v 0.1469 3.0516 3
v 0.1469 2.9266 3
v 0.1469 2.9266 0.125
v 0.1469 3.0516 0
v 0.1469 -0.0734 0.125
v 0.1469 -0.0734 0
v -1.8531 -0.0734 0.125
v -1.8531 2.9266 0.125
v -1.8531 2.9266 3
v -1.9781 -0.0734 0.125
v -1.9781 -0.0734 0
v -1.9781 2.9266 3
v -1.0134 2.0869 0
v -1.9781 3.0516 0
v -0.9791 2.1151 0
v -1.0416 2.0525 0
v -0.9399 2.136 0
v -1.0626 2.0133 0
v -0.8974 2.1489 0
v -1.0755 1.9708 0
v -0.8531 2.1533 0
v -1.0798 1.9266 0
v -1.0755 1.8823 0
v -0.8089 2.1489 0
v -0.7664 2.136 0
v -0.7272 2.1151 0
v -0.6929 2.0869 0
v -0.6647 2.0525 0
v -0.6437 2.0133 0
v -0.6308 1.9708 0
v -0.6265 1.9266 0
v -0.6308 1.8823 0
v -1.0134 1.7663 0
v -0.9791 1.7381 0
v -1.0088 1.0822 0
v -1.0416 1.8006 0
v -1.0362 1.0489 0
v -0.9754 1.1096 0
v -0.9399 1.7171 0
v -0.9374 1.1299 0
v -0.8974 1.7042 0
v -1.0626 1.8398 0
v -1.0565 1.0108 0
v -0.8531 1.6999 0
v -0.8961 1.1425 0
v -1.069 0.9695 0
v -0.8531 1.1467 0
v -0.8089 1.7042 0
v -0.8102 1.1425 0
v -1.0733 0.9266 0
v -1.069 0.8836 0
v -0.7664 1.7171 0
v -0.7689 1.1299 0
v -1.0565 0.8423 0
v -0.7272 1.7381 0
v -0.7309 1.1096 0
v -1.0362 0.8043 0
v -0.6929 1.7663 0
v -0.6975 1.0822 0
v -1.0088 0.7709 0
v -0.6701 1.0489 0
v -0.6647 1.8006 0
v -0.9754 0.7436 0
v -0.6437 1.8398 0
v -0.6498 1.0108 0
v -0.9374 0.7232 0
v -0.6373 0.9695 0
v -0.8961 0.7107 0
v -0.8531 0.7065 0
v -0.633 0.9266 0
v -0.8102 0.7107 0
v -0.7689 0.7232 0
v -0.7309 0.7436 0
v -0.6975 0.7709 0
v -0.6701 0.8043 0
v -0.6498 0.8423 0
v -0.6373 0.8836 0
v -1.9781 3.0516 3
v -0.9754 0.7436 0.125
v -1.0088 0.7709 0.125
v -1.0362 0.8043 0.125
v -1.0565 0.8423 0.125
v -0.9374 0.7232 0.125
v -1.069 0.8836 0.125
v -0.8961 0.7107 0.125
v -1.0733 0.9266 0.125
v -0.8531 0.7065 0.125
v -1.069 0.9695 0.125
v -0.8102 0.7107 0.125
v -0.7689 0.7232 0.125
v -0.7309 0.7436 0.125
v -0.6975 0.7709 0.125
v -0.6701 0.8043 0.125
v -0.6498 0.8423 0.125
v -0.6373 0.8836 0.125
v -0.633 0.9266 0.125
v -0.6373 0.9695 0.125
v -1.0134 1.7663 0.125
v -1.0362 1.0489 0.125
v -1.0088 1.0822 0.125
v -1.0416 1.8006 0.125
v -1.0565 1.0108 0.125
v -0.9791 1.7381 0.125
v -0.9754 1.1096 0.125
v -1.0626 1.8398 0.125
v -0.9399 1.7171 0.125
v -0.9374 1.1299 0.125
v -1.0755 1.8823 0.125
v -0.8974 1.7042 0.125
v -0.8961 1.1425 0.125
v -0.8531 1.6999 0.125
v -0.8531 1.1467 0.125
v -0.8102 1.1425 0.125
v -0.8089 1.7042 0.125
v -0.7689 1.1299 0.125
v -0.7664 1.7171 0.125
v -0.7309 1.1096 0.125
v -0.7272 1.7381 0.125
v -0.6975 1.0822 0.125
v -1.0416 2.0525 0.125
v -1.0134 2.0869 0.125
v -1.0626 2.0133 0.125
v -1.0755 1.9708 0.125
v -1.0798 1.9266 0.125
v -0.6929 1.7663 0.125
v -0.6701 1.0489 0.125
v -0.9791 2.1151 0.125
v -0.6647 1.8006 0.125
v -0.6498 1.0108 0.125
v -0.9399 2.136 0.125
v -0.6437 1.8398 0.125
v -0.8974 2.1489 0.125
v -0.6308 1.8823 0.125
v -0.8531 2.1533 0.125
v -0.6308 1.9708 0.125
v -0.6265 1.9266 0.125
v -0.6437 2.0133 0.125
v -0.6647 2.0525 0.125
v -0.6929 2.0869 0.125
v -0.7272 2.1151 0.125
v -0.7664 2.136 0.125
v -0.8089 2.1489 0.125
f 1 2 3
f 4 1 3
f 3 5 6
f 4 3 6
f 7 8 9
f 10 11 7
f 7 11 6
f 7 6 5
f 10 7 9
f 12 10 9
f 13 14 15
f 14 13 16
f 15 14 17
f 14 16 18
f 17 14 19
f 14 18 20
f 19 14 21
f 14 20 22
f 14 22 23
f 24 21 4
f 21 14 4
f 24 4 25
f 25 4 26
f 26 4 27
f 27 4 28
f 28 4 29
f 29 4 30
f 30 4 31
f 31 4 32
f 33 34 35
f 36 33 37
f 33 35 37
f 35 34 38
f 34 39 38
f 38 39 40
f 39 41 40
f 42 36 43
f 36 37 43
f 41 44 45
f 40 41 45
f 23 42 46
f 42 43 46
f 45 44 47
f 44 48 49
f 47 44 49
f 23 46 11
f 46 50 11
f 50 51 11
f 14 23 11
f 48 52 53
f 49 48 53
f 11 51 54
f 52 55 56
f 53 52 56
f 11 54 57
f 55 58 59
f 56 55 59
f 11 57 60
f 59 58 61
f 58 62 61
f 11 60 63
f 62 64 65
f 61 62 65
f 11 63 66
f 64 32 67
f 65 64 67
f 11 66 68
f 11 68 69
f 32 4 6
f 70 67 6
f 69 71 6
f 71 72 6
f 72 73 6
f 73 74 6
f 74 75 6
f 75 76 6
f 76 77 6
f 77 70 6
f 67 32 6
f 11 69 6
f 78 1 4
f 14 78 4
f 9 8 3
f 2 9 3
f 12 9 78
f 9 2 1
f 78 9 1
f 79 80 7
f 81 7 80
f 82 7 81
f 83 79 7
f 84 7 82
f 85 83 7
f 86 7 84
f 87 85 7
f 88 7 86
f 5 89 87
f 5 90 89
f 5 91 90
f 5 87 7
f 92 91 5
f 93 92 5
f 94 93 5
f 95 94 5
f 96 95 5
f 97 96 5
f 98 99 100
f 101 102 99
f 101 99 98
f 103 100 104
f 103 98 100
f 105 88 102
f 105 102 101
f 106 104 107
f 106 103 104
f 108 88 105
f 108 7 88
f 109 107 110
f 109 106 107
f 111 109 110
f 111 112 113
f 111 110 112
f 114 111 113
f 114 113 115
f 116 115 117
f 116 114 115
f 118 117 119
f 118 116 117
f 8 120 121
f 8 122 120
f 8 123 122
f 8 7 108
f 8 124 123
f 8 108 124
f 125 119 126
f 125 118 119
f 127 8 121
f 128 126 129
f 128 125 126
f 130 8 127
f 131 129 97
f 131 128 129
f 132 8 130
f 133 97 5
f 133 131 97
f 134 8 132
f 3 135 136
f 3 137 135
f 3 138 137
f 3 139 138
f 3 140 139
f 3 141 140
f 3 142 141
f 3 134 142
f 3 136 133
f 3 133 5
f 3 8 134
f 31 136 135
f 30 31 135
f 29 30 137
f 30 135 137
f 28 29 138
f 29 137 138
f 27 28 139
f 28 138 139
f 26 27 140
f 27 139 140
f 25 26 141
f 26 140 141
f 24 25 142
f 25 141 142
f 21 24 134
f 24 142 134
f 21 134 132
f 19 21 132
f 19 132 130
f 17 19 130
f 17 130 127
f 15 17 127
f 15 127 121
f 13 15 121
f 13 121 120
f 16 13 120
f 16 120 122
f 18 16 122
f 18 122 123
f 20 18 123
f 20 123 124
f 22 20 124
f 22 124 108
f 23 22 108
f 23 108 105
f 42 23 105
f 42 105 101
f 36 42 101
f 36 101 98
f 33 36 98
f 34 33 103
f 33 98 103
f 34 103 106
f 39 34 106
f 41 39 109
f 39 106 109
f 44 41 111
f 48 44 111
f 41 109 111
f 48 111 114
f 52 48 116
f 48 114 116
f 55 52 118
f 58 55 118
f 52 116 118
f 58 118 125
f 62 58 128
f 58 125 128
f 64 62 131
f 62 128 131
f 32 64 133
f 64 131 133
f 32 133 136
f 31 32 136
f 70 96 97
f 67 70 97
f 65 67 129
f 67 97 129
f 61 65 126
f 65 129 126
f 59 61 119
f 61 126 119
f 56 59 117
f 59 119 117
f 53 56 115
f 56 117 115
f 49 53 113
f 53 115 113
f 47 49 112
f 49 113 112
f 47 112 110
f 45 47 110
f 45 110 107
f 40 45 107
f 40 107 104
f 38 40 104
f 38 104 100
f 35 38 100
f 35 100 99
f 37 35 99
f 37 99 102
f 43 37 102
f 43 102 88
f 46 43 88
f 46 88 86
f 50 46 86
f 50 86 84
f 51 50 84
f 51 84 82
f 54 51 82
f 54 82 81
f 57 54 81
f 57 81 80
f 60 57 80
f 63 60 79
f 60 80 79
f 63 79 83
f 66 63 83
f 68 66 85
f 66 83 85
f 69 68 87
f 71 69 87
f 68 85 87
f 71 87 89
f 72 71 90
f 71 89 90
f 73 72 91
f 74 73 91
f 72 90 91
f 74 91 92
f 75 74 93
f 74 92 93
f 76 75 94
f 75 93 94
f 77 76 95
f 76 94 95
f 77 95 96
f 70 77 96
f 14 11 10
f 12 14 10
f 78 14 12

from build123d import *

# Parameters (mm, degrees)
SKETCH_1_W          = 2
SKETCH_1_H          = 3
EXTRUDE_1_DEPTH     = 0.125
SKETCH_2_W          = 2
SKETCH_2_H          = 3
EXTRUDE_2_DEPTH     = 0.125
EXTRUDE_3_DEPTH     = 0.125
SKETCH_4_R          = 0.22010833
SKETCH_4_R_2        = 0.226682005
CUT_EXTRUDE_1_DEPTH = 5.635816039


with BuildPart() as part:
    # 草图1 → 凸台-拉伸1 (new body)
    with BuildSketch(Plane.XY):
        with Locations((-0.853146853, 1.426573427)):
            Rectangle(SKETCH_1_W, SKETCH_1_H)
    extrude(amount=EXTRUDE_1_DEPTH)

    # 草图2 → 凸台-拉伸2 (add)
    with BuildSketch(Plane(origin=(0, 2.926573427, 0), x_dir=(1, 0, 0), z_dir=(0, 1, 0))):
        with Locations((-0.853146853, -1.5)):
            Rectangle(SKETCH_2_W, SKETCH_2_H)
    extrude(amount=EXTRUDE_2_DEPTH)

    # 草图3 → 凸台-拉伸3 (add)
    with BuildSketch(Plane.ZY.offset(1.853146853)):
        Polygon((0, 3.051573427), (0, -0.073426573), (0.125, -0.073426573), (3, 2.926573427), (3, 3.051573427), align=None)
    extrude(amount=EXTRUDE_3_DEPTH)

    # 草图4 → 切除-拉伸1 (cut, through all)
    with BuildSketch(Plane.XY.offset(0.125)):
        with Locations((-0.853146853, 0.926573427)):
            Circle(SKETCH_4_R)
        with Locations((-0.853146853, 1.926573427)):
            Circle(SKETCH_4_R_2)
    extrude(amount=-CUT_EXTRUDE_1_DEPTH, mode=Mode.SUBTRACT)


solid = part.part
